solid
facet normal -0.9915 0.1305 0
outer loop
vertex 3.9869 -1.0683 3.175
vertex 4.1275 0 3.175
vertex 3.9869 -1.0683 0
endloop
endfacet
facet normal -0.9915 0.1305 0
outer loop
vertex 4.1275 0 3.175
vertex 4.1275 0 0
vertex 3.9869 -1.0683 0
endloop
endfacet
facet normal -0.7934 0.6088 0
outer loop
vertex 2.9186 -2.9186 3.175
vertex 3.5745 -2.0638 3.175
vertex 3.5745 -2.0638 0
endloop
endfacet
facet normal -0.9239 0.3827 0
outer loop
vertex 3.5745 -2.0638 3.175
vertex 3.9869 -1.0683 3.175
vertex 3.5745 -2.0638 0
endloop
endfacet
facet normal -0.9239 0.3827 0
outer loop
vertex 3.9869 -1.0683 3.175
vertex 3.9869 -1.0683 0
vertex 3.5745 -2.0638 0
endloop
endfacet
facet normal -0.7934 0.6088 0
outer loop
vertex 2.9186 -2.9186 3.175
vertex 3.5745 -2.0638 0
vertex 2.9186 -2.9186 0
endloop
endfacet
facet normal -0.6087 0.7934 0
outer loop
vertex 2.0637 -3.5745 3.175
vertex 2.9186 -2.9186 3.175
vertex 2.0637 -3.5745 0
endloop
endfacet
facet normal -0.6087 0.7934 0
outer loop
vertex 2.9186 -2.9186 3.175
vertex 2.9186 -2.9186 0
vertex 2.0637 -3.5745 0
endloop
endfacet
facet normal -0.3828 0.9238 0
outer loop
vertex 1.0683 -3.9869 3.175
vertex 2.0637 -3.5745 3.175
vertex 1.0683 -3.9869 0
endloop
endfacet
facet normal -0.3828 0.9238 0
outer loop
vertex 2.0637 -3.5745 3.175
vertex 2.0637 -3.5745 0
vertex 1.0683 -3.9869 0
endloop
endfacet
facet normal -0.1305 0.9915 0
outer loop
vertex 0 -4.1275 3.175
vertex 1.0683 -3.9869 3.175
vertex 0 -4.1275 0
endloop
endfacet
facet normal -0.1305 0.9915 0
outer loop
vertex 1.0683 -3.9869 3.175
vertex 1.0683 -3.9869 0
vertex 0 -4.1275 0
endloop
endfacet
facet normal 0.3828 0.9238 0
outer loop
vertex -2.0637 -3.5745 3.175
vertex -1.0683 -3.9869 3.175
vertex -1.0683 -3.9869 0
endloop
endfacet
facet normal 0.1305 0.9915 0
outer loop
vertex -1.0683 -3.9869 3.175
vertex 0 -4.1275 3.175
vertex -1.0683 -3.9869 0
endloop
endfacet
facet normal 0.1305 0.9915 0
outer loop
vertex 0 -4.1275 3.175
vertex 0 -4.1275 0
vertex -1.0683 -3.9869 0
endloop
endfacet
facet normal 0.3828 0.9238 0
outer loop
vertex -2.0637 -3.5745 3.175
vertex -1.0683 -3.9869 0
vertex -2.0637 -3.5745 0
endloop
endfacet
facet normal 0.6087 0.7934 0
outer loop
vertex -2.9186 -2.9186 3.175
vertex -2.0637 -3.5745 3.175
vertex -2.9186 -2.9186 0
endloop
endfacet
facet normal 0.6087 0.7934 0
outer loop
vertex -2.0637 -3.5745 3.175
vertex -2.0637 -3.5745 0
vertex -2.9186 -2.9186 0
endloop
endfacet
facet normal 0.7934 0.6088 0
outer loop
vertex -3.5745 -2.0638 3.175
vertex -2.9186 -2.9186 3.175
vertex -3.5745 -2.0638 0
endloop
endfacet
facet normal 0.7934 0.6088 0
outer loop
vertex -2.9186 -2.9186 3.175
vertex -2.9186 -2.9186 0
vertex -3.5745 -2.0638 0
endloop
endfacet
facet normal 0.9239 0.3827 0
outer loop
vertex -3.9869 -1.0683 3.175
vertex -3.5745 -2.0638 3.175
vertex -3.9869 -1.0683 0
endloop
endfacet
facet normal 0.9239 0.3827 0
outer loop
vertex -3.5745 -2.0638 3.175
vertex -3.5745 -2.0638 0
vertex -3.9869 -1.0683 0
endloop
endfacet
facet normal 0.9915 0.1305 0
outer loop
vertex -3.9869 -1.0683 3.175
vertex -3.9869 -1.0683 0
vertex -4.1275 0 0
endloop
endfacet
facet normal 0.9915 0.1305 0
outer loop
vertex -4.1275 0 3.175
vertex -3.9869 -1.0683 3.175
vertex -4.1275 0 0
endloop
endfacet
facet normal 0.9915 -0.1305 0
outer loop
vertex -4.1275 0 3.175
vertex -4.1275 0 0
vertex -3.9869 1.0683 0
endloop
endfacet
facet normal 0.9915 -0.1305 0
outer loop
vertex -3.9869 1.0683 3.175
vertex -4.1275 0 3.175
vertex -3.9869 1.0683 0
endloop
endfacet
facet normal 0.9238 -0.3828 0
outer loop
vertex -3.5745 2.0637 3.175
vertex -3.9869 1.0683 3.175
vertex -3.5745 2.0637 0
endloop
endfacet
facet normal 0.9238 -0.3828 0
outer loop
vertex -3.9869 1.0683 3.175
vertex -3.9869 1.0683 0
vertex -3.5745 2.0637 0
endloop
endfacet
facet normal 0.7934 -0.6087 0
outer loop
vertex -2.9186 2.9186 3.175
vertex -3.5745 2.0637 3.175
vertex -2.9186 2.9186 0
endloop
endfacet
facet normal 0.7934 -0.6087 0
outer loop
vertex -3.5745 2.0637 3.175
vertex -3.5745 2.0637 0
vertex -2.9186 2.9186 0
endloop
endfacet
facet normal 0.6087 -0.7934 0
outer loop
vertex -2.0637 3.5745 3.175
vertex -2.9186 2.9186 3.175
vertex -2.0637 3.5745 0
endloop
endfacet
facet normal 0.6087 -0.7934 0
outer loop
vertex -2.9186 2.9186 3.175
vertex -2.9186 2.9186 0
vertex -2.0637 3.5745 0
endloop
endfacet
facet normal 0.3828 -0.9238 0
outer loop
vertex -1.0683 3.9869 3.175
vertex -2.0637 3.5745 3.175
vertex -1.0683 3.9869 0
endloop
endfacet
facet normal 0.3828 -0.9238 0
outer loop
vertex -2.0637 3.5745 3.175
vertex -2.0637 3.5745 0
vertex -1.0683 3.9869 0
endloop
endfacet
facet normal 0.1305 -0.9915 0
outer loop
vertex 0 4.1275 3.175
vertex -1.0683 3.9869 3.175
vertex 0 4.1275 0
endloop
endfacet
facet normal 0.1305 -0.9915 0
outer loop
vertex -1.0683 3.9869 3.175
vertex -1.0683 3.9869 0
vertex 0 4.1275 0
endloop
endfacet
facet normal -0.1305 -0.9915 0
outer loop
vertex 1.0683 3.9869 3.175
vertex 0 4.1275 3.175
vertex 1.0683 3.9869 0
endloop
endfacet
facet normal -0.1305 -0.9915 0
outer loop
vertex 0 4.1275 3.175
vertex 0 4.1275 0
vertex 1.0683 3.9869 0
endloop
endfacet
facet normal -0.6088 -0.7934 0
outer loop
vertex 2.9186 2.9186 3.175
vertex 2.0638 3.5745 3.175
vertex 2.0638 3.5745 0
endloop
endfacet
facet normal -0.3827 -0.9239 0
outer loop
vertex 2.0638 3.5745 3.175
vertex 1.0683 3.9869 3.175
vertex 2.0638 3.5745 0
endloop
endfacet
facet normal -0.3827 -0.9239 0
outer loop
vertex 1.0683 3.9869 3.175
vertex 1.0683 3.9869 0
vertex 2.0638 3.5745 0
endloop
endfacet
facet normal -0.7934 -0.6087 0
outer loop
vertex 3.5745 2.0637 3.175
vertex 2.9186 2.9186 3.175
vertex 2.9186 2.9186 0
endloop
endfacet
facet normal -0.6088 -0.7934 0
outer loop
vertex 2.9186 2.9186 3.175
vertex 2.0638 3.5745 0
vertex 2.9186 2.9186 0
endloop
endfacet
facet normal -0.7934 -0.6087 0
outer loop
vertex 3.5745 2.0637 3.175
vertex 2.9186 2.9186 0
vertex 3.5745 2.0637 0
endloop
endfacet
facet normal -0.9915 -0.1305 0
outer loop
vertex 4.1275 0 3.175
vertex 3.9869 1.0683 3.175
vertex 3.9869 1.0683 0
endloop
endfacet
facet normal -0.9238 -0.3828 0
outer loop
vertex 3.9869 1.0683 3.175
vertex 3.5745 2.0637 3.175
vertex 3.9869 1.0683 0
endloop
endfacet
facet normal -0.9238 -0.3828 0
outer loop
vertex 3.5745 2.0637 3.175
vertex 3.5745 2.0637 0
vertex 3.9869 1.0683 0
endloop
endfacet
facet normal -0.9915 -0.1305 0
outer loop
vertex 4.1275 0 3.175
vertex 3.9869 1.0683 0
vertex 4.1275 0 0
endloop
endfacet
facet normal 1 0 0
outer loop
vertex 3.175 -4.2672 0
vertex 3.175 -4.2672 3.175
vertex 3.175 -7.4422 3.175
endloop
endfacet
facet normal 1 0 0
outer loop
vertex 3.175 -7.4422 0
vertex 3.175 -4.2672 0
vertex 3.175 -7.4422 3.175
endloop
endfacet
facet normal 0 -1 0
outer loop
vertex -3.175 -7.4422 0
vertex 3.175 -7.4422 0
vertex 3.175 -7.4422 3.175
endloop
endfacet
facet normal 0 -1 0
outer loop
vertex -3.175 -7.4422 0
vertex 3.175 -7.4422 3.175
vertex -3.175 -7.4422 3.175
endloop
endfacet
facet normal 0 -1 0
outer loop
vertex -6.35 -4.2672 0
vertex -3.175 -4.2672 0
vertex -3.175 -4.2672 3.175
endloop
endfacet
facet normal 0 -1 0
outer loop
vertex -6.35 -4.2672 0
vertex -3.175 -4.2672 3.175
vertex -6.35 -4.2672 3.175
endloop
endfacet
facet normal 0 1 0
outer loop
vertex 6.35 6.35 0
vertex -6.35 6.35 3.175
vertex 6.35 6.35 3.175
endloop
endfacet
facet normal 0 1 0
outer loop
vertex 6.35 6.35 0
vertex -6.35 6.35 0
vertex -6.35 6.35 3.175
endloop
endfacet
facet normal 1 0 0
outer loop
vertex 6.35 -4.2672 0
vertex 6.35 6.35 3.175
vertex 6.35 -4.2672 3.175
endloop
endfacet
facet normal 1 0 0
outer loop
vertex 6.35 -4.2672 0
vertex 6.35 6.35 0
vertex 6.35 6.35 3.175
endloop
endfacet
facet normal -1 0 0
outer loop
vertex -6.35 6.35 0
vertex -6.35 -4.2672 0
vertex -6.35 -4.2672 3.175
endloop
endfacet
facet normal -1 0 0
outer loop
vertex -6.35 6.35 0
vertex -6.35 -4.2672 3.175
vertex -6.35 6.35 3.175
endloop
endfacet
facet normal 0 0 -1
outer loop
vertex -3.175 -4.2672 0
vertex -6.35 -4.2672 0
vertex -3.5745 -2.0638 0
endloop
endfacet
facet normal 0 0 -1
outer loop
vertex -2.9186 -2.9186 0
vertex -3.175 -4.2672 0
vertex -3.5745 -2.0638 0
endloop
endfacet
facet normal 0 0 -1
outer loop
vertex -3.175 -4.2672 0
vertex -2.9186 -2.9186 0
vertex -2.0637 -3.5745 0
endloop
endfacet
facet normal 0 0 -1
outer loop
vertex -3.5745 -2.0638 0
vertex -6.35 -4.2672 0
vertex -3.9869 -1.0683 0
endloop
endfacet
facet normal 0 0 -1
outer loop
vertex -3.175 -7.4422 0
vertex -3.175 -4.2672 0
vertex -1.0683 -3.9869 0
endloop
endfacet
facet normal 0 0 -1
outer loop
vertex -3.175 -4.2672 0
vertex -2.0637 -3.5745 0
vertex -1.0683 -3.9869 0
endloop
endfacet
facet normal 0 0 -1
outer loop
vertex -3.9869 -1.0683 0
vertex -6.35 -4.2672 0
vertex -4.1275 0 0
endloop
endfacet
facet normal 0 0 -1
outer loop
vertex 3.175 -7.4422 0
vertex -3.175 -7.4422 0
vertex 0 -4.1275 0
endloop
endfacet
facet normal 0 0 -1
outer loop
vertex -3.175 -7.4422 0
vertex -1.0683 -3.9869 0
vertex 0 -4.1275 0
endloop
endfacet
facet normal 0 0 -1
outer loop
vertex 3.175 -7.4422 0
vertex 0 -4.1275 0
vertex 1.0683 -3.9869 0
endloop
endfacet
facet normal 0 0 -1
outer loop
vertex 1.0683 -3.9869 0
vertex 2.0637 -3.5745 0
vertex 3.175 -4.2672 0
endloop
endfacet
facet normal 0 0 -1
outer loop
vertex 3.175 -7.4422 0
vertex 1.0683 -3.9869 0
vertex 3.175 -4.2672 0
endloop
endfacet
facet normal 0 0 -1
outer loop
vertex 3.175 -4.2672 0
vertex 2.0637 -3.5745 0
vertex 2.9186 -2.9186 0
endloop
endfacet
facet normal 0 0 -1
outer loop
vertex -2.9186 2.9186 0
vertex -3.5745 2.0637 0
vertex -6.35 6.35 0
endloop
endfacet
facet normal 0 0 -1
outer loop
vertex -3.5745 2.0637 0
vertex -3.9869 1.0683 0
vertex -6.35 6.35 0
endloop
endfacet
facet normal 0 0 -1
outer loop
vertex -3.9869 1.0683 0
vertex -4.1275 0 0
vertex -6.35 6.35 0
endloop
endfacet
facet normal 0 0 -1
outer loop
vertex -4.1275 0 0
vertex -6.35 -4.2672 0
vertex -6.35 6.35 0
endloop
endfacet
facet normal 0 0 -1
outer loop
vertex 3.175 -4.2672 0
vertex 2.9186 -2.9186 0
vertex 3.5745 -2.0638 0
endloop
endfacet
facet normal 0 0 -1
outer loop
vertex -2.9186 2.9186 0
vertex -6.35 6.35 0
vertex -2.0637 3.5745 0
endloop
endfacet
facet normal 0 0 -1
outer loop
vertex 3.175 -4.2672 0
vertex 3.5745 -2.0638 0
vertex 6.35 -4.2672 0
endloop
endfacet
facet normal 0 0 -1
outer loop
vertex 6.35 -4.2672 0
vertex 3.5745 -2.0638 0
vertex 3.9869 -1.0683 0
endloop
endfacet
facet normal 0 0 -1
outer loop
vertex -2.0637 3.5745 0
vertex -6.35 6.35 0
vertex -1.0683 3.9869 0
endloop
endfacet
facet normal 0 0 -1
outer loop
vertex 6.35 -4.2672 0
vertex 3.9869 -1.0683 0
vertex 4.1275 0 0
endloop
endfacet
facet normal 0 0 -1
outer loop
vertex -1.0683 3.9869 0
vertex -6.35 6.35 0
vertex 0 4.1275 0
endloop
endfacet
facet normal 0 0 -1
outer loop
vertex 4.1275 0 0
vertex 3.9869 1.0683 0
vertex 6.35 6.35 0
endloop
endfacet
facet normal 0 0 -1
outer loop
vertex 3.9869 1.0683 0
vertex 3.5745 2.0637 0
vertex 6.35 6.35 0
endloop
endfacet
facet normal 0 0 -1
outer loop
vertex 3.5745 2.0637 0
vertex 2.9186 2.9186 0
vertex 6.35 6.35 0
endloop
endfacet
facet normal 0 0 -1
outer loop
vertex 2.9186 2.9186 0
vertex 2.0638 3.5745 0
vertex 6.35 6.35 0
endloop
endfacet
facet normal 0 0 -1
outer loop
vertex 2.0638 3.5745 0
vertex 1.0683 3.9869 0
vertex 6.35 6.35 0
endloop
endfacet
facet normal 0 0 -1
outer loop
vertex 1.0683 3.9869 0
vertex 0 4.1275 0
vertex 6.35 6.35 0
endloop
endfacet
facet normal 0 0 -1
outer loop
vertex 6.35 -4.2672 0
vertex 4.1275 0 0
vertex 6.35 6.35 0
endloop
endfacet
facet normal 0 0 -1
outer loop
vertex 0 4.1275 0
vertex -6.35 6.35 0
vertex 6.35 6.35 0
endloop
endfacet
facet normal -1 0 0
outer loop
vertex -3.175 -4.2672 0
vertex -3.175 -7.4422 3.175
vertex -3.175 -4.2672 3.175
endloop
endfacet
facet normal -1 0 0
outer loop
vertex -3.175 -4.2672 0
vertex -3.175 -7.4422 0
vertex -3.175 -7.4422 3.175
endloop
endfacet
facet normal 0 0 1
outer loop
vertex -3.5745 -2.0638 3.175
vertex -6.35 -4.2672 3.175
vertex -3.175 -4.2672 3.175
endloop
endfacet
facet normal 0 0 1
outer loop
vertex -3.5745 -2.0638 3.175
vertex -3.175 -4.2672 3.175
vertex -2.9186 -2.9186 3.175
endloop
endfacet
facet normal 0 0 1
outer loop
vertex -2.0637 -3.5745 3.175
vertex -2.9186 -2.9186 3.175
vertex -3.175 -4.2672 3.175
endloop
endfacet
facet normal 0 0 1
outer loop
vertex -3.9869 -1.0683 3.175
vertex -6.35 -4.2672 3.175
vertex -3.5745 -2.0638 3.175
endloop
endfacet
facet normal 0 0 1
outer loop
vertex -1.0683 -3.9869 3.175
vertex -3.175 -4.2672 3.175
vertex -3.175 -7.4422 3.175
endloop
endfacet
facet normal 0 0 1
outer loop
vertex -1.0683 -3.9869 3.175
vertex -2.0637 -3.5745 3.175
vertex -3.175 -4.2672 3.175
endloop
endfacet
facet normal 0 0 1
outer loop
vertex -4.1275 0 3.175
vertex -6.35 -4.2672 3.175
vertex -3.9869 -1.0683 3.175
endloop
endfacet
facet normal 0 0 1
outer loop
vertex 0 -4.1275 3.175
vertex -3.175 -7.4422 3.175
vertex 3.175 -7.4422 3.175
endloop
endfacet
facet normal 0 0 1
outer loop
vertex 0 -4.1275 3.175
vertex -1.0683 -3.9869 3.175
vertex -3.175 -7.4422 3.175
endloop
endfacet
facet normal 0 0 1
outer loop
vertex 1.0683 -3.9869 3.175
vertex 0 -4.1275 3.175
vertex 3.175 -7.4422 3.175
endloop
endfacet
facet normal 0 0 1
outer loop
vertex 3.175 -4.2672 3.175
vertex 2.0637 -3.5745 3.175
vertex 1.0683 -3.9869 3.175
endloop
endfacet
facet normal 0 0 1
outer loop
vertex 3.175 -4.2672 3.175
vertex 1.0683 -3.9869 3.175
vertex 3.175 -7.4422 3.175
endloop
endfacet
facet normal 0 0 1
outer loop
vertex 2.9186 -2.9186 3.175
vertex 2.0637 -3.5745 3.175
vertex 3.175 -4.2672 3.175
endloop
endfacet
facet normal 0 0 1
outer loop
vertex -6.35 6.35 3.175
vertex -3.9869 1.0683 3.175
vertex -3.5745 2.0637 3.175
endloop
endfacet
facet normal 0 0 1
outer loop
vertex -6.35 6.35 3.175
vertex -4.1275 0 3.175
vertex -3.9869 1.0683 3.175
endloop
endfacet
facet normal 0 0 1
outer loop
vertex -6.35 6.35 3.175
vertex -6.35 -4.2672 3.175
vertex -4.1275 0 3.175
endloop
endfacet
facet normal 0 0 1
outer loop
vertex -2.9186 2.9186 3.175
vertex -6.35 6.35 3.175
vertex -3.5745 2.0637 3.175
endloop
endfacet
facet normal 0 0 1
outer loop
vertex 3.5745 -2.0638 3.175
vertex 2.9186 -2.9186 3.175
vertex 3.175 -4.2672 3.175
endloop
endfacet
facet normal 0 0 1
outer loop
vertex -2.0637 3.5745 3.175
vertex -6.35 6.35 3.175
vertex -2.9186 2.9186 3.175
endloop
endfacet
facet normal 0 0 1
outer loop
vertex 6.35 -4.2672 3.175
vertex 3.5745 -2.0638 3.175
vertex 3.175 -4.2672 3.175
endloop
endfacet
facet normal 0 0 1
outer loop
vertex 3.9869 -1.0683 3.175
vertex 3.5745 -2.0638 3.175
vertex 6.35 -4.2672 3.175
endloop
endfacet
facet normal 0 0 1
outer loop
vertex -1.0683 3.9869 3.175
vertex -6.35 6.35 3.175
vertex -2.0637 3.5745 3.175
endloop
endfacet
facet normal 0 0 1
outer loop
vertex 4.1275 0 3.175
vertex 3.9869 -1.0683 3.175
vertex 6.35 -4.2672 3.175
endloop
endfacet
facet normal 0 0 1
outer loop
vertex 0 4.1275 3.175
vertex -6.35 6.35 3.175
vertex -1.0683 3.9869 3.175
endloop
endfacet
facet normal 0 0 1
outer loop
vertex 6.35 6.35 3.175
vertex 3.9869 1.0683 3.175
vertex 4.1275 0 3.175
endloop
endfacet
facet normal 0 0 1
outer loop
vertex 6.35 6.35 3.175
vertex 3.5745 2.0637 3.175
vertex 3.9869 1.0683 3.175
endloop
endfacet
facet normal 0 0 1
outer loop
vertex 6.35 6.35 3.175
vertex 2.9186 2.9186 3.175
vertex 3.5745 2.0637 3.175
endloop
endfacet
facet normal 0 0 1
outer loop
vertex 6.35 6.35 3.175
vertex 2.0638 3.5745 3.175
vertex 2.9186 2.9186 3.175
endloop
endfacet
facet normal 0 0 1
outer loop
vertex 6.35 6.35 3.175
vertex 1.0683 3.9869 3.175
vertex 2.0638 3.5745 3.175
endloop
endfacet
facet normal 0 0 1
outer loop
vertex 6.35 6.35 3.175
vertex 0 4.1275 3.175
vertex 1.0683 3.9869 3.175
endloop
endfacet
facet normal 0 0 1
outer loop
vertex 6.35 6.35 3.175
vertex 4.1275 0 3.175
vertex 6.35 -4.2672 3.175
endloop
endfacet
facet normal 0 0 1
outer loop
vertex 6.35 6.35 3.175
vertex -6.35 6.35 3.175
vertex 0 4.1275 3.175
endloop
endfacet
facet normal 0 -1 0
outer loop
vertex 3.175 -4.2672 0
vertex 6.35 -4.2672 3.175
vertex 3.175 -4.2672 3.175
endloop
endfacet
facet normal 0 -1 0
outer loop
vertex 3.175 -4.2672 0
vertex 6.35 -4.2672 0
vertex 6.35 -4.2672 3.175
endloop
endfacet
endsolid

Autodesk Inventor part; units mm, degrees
ref_plane "YZ Plane" through (0, 0, 0) normal (1, 0, 0) x (0, 1, 0)
ref_plane "XZ Plane" through (0, 0, 0) normal (0, 1, 0) x (-1, 0, 0)
ref_plane "XY Plane" through (0, 0, 0) normal (0, 0, 1) x (1, 0, 0)
sketch "Sketch1" plane through (0, 0, 0) normal (0, 0, 1) x (1, 0, 0)
  circle A0 centre (0, 0) radius 4.1275
  line L0 (-6.35, 6.35) -> (6.35, 6.35)
  line L1 (6.35, 6.35) -> (6.35, -4.2672)
  line L2 (6.35, -4.2672) -> (-6.35, -4.2672)
  line L3 (-6.35, -4.2672) -> (-6.35, 6.35)
  line L4 (-3.175, -4.2672) -> (3.175, -4.2672)
  line L5 (3.175, -4.2672) -> (3.175, -7.4422)
  line L6 (3.175, -7.4422) -> (-3.175, -7.4422)
  line L7 (-3.175, -7.4422) -> (-3.175, -4.2672)
  dimension "d0" = 8.255
  dimension "d1" = 4.2672
  dimension "d2" = 6.35
  dimension "d3" = 6.35
  dimension "d4" = 6.35
  dimension "d5" = 3.175
  dimension "d6" = 3.175
  dimension "d7" = 3.175
extrude "Extrusion1" add sketch "Sketch1" along normal blind 3.175
properties part number "rod holder"
